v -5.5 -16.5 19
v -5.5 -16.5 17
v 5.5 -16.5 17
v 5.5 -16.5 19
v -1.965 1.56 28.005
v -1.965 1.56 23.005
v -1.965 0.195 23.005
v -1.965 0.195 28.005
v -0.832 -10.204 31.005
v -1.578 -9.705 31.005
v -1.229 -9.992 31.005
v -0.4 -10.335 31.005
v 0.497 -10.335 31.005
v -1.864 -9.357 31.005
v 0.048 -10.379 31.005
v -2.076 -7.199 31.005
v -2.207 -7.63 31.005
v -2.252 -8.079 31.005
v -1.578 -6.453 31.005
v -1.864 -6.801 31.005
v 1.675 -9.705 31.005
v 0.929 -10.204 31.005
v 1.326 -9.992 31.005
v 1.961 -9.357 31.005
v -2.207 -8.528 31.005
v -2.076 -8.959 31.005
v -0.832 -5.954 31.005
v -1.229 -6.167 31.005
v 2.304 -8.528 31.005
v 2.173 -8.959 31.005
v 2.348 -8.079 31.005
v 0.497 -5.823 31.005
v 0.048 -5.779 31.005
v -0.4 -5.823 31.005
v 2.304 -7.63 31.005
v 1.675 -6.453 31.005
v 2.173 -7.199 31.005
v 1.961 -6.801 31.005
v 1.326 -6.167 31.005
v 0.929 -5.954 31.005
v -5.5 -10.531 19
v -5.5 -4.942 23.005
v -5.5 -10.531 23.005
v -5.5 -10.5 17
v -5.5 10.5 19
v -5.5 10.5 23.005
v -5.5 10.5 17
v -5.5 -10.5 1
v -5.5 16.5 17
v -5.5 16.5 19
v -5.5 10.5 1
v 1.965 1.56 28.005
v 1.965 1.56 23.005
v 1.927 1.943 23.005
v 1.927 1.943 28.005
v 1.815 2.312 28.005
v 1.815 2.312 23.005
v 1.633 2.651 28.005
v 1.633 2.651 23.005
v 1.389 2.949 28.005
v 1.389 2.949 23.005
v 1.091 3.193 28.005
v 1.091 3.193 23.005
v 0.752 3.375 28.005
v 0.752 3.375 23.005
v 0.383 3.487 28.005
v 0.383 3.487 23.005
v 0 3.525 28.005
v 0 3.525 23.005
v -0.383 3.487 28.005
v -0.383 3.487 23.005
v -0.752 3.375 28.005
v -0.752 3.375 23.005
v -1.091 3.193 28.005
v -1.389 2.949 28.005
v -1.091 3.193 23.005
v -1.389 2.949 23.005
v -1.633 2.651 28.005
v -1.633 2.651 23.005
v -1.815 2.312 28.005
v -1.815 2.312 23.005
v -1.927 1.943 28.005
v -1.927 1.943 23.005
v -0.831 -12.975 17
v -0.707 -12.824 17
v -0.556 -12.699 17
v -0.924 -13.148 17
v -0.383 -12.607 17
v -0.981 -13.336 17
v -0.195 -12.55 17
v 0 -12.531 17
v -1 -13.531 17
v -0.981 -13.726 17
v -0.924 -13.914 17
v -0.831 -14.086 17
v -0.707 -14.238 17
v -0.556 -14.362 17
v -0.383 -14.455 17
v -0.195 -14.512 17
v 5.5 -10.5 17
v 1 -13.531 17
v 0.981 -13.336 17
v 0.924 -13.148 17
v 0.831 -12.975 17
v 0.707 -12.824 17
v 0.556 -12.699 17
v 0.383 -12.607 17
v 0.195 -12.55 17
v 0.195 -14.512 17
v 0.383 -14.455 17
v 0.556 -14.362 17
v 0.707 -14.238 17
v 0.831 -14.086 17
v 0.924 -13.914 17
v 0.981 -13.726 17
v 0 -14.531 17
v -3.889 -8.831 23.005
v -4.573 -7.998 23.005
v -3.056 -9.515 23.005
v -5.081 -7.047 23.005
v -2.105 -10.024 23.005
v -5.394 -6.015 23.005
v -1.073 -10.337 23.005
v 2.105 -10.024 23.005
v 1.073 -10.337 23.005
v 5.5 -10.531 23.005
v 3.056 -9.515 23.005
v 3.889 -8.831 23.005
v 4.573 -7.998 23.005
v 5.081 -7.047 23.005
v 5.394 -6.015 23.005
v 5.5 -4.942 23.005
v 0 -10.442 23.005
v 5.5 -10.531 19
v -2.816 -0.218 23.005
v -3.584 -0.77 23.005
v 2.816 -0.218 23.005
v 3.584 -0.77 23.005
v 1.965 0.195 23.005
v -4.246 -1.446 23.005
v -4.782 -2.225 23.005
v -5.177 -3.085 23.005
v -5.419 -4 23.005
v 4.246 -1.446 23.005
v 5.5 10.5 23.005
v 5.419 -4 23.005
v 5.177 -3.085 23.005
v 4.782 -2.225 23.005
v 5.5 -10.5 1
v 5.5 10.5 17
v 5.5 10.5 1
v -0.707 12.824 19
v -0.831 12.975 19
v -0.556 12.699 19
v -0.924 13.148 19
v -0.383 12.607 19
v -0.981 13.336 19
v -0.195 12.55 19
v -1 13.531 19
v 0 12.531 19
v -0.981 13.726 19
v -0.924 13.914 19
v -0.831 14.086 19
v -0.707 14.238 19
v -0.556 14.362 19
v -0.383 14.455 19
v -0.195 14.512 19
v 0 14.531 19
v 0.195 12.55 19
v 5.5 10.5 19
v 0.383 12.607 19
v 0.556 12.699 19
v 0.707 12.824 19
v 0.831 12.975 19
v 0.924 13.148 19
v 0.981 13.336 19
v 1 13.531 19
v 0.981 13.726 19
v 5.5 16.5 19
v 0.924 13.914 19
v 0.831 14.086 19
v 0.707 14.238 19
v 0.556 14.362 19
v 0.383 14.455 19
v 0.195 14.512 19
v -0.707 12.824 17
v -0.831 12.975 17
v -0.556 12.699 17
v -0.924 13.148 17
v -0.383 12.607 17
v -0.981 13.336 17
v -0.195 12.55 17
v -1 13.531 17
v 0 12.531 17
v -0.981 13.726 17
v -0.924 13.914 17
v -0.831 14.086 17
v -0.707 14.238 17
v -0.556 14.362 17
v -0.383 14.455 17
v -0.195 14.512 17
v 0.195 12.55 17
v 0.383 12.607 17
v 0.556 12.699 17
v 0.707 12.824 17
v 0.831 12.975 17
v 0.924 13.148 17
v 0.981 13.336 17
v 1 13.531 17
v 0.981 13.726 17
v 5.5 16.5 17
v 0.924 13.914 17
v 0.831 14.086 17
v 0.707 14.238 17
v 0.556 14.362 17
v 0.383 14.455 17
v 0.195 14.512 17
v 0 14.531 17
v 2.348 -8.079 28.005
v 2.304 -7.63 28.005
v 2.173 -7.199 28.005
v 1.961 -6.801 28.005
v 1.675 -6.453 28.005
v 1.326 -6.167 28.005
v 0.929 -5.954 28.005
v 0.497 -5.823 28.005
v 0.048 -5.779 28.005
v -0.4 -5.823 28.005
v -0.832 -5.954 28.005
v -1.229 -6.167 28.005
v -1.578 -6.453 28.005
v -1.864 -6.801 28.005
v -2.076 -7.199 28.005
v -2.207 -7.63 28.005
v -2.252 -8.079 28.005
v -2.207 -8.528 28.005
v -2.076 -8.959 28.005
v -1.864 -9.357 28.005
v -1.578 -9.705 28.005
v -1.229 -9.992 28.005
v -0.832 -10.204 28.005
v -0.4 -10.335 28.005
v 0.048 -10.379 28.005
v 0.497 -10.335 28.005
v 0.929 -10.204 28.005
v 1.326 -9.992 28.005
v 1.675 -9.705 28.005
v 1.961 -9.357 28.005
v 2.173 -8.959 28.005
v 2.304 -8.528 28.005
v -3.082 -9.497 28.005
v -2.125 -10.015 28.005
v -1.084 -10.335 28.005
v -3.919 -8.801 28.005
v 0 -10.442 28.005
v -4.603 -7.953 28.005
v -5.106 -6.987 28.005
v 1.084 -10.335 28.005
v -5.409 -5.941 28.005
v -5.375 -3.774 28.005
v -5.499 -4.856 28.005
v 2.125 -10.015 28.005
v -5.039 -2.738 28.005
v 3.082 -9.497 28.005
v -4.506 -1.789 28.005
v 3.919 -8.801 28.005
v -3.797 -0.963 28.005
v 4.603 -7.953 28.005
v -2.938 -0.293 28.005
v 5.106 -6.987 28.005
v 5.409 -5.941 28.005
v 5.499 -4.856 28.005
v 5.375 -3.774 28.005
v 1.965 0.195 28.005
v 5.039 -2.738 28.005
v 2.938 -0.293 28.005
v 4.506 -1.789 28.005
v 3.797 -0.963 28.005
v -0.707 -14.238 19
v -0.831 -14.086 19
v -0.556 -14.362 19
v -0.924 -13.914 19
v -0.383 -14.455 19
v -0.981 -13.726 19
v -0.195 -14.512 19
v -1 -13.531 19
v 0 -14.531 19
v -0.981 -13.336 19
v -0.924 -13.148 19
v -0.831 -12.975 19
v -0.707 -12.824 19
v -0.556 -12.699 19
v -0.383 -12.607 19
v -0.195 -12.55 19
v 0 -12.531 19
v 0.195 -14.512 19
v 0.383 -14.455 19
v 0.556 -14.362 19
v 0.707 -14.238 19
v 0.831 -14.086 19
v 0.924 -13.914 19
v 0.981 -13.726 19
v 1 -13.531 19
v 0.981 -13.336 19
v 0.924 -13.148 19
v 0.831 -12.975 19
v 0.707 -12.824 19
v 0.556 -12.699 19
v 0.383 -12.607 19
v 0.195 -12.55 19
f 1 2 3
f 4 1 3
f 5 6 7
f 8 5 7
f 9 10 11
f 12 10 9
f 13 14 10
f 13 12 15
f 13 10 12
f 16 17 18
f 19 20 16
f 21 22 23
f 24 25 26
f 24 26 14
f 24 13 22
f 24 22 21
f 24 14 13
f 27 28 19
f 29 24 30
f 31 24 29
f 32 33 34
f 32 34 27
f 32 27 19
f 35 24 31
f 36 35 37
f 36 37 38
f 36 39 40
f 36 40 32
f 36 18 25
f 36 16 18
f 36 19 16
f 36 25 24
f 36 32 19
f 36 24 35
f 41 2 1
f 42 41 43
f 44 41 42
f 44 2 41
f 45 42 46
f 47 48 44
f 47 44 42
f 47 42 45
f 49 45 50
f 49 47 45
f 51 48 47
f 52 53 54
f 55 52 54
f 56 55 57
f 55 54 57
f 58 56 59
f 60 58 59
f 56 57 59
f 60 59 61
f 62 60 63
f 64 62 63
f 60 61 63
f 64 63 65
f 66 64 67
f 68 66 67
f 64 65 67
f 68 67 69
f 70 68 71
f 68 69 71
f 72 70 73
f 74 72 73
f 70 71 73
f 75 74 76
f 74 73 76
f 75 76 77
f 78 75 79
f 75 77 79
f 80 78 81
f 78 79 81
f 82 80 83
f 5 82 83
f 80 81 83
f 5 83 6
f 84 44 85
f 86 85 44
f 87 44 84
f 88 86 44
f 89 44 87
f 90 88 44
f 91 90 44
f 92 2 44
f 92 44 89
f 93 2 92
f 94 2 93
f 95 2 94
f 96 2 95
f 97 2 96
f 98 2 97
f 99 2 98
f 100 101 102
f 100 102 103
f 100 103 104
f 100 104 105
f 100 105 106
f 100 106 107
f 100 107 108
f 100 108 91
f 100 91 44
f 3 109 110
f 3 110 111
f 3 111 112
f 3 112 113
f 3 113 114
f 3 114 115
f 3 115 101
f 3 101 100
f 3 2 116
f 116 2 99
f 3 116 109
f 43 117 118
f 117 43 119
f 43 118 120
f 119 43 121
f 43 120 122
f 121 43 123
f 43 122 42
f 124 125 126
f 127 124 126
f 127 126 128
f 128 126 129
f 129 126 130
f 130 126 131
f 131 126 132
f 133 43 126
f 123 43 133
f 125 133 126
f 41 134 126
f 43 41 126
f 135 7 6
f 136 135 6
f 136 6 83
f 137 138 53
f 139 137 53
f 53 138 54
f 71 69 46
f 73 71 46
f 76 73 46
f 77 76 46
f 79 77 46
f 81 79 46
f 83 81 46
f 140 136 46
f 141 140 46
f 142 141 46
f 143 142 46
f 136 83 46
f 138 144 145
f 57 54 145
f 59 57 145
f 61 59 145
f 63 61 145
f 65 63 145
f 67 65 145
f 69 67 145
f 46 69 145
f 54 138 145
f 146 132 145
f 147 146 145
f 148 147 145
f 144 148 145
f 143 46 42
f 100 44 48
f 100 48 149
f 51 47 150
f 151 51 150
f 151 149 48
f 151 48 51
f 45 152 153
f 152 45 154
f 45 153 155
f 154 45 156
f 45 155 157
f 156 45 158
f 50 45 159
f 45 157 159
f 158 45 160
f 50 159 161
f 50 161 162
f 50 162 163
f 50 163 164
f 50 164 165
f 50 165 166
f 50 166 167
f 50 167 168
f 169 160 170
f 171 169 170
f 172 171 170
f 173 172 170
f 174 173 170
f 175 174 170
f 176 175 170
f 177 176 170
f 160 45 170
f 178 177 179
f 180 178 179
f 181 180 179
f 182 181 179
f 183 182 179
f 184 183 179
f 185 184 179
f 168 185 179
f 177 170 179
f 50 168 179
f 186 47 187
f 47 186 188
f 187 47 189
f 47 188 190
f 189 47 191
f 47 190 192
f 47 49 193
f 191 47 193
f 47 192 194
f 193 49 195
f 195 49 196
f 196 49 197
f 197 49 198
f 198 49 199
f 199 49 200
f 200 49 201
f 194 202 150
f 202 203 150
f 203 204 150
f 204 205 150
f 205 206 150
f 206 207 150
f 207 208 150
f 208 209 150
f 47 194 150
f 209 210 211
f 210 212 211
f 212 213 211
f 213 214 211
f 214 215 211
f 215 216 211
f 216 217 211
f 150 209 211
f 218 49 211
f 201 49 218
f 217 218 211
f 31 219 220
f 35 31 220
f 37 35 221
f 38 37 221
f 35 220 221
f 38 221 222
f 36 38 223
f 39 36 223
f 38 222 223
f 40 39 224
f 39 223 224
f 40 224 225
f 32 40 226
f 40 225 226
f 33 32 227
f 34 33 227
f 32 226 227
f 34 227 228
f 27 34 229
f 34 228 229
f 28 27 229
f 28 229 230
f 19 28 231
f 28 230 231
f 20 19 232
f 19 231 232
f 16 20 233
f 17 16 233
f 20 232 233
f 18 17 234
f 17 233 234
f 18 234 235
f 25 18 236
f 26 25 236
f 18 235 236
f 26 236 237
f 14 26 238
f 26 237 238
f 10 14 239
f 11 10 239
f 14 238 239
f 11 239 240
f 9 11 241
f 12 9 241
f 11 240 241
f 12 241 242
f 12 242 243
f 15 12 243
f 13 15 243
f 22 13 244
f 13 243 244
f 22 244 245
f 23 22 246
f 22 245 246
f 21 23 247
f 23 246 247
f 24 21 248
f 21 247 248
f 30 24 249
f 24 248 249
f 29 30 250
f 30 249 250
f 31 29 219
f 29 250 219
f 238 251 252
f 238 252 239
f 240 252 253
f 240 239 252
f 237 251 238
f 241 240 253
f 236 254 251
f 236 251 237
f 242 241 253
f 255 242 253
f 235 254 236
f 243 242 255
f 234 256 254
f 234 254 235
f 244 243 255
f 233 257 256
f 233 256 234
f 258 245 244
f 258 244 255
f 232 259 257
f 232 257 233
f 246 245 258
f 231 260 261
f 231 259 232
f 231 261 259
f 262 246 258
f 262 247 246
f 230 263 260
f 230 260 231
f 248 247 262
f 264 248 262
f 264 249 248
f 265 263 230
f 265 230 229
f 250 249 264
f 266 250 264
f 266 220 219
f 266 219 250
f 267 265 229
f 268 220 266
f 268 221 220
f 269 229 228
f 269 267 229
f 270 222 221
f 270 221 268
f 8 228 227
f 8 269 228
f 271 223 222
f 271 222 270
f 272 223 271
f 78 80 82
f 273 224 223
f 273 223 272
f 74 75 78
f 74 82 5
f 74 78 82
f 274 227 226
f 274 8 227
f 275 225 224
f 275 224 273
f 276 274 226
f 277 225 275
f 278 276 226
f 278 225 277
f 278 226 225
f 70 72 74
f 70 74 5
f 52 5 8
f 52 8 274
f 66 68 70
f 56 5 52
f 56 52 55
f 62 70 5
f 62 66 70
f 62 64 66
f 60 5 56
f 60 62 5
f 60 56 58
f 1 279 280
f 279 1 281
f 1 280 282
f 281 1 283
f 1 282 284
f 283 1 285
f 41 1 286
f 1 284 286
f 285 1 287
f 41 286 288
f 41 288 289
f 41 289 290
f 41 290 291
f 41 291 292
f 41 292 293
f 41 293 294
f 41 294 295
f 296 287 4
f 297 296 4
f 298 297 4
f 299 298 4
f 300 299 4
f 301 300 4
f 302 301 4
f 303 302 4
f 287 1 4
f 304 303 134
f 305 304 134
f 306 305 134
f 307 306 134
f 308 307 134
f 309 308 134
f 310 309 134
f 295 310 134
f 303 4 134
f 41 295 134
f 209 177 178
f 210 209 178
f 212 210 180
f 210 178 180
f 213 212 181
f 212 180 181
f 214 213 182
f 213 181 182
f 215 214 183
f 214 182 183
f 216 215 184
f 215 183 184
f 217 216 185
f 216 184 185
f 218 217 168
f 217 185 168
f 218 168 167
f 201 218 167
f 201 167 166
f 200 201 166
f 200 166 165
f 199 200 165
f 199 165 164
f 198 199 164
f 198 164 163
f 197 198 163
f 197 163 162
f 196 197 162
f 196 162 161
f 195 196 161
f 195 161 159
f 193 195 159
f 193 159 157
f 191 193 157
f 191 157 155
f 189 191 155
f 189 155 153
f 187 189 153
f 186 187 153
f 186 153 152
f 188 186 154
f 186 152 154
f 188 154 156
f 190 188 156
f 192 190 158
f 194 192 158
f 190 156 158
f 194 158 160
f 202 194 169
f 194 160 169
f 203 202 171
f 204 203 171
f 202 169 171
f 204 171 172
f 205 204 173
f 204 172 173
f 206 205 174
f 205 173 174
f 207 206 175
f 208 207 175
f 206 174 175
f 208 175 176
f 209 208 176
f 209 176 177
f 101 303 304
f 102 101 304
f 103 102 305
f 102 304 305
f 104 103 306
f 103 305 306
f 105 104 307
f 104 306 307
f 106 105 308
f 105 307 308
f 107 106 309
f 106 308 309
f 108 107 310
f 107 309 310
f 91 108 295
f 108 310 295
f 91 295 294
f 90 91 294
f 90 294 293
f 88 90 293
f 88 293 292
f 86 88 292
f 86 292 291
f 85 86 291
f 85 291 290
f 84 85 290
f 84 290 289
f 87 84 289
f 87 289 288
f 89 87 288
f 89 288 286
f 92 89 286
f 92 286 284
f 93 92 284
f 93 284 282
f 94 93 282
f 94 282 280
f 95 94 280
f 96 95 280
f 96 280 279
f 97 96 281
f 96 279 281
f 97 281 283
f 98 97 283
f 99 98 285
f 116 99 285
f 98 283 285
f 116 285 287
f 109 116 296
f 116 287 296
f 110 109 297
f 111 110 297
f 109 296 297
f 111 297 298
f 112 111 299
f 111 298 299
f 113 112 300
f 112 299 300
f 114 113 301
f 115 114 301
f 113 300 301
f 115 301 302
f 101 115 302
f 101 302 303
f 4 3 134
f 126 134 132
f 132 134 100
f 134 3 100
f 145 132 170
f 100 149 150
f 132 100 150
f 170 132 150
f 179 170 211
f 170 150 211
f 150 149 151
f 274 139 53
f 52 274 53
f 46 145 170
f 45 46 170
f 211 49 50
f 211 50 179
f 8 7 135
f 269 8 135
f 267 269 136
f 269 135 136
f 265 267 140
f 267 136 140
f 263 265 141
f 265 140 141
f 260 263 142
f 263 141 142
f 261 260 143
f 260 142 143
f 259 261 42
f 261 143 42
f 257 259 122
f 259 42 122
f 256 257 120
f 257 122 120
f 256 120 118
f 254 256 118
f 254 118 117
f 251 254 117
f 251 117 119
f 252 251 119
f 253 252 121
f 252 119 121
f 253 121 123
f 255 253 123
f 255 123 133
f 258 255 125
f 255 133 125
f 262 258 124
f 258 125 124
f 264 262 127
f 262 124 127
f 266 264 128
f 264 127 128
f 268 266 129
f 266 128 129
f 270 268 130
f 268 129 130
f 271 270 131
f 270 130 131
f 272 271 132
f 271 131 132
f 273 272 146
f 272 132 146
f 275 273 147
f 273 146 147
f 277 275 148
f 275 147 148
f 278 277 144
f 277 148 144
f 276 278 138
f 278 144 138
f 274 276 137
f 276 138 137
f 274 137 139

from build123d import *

# Parameters (mm, degrees)
CROQUIS1_W              = 11
CROQUIS1_H              = 33
SALIENTE_EXTRUIR1_DEPTH = 33
CROQUIS2_W              = 11
CROQUIS2_H              = 17
CORTAR_EXTRUIR1_DEPTH   = 6
CORTAR_EXTRUIR2_REACH   = 13
SALIENTE_EXTRUIR4_DEPTH = 5
CROQUIS7_R              = 2.3
SALIENTE_EXTRUIR5_DEPTH = 3
CROQUIS8_R              = 1
CORTAR_EXTRUIR4_DEPTH   = 3
CROQUIS9_W              = 1
CROQUIS9_H              = 21
CORTAR_EXTRUIR5_DEPTH   = 20


with BuildPart() as part:
    # Croquis1 → Saliente-Extruir1 (new body)
    with BuildSketch(Plane.XY):
        Rectangle(CROQUIS1_W, CROQUIS1_H)
    extrude(amount=SALIENTE_EXTRUIR1_DEPTH)

    # Croquis2 → Cortar-Extruir1 (cut)
    with BuildSketch(Plane.XZ.offset(16.5)):
        with Locations((0, 8.5)):
            Rectangle(CROQUIS2_W, CROQUIS2_H)
    cortar_extruir1 = extrude(amount=-CORTAR_EXTRUIR1_DEPTH, mode=Mode.SUBTRACT)

    # Simetría1: Cortar-Extruir1 across plane
    add(cortar_extruir1.mirror(Plane.ZX), mode=Mode.SUBTRACT)

    # Croquis3 → Cortar-Extruir2 (cut, up to next)
    with BuildSketch(Plane(origin=(5.5, 0, 0), x_dir=(0, 0, -1), z_dir=(1, 0, 0)), mode=Mode.PRIVATE) as cortar_extruir2_sk1:
        Polygon((-19, -16.5), (-19, -10.530920557), (-23.005061079, -10.530920557), (-23.005061079, 10.5), (-19, 10.5), (-19, 16.5), (-33, 16.5), (-33, -16.5), align=None)
    cortar_extruir2_tool1 = extrude(cortar_extruir2_sk1.sketch, amount=-CORTAR_EXTRUIR2_REACH, mode=Mode.PRIVATE) & part.part
    add(cortar_extruir2_tool1.solids().sort_by_distance((5.5, 0.003447, 27.11427))[0], mode=Mode.SUBTRACT)

    # Croquis6 → Saliente-Extruir4 (add)
    with BuildSketch(Plane.XY.offset(23.005061079)):
        with BuildLine():
            Line((-1.964593249, 1.559922557), (-1.964593249, 0.194840348))
            ThreePointArc((-1.964593249, 0.194840348), (0, -10.442315807), (1.964593249, 0.194840348))
            Line((1.964593249, 0.194840348), (1.964593249, 1.559922557))
            ThreePointArc((1.964593249, 1.559922557), (0, 3.524515805), (-1.964593249, 1.559922557))
        make_face()
    extrude(amount=SALIENTE_EXTRUIR4_DEPTH)

    # Croquis7 → Saliente-Extruir5 (add)
    with BuildSketch(Plane.XY.offset(28.005061079)):
        with Locations((0.048442296, -8.079125274)):
            Circle(CROQUIS7_R)
    extrude(amount=SALIENTE_EXTRUIR5_DEPTH)

    # Croquis8 → Cortar-Extruir4 (cut)
    with BuildSketch(Plane.XY.offset(19)):
        with Locations((0, -13.530920557)):
            Circle(CROQUIS8_R)
        with Locations((0, 13.530920557)):
            Circle(CROQUIS8_R)
    extrude(amount=-CORTAR_EXTRUIR4_DEPTH, mode=Mode.SUBTRACT)

    # Croquis9 → Cortar-Extruir5 (cut)
    with BuildSketch(Plane(origin=(5.5, 0, 0), x_dir=(0, 0, -1), z_dir=(1, 0, 0))):
        with Locations((-0.5, 0)):
            Rectangle(CROQUIS9_W, CROQUIS9_H)
    extrude(amount=-CORTAR_EXTRUIR5_DEPTH, mode=Mode.SUBTRACT)


solid = part.part
